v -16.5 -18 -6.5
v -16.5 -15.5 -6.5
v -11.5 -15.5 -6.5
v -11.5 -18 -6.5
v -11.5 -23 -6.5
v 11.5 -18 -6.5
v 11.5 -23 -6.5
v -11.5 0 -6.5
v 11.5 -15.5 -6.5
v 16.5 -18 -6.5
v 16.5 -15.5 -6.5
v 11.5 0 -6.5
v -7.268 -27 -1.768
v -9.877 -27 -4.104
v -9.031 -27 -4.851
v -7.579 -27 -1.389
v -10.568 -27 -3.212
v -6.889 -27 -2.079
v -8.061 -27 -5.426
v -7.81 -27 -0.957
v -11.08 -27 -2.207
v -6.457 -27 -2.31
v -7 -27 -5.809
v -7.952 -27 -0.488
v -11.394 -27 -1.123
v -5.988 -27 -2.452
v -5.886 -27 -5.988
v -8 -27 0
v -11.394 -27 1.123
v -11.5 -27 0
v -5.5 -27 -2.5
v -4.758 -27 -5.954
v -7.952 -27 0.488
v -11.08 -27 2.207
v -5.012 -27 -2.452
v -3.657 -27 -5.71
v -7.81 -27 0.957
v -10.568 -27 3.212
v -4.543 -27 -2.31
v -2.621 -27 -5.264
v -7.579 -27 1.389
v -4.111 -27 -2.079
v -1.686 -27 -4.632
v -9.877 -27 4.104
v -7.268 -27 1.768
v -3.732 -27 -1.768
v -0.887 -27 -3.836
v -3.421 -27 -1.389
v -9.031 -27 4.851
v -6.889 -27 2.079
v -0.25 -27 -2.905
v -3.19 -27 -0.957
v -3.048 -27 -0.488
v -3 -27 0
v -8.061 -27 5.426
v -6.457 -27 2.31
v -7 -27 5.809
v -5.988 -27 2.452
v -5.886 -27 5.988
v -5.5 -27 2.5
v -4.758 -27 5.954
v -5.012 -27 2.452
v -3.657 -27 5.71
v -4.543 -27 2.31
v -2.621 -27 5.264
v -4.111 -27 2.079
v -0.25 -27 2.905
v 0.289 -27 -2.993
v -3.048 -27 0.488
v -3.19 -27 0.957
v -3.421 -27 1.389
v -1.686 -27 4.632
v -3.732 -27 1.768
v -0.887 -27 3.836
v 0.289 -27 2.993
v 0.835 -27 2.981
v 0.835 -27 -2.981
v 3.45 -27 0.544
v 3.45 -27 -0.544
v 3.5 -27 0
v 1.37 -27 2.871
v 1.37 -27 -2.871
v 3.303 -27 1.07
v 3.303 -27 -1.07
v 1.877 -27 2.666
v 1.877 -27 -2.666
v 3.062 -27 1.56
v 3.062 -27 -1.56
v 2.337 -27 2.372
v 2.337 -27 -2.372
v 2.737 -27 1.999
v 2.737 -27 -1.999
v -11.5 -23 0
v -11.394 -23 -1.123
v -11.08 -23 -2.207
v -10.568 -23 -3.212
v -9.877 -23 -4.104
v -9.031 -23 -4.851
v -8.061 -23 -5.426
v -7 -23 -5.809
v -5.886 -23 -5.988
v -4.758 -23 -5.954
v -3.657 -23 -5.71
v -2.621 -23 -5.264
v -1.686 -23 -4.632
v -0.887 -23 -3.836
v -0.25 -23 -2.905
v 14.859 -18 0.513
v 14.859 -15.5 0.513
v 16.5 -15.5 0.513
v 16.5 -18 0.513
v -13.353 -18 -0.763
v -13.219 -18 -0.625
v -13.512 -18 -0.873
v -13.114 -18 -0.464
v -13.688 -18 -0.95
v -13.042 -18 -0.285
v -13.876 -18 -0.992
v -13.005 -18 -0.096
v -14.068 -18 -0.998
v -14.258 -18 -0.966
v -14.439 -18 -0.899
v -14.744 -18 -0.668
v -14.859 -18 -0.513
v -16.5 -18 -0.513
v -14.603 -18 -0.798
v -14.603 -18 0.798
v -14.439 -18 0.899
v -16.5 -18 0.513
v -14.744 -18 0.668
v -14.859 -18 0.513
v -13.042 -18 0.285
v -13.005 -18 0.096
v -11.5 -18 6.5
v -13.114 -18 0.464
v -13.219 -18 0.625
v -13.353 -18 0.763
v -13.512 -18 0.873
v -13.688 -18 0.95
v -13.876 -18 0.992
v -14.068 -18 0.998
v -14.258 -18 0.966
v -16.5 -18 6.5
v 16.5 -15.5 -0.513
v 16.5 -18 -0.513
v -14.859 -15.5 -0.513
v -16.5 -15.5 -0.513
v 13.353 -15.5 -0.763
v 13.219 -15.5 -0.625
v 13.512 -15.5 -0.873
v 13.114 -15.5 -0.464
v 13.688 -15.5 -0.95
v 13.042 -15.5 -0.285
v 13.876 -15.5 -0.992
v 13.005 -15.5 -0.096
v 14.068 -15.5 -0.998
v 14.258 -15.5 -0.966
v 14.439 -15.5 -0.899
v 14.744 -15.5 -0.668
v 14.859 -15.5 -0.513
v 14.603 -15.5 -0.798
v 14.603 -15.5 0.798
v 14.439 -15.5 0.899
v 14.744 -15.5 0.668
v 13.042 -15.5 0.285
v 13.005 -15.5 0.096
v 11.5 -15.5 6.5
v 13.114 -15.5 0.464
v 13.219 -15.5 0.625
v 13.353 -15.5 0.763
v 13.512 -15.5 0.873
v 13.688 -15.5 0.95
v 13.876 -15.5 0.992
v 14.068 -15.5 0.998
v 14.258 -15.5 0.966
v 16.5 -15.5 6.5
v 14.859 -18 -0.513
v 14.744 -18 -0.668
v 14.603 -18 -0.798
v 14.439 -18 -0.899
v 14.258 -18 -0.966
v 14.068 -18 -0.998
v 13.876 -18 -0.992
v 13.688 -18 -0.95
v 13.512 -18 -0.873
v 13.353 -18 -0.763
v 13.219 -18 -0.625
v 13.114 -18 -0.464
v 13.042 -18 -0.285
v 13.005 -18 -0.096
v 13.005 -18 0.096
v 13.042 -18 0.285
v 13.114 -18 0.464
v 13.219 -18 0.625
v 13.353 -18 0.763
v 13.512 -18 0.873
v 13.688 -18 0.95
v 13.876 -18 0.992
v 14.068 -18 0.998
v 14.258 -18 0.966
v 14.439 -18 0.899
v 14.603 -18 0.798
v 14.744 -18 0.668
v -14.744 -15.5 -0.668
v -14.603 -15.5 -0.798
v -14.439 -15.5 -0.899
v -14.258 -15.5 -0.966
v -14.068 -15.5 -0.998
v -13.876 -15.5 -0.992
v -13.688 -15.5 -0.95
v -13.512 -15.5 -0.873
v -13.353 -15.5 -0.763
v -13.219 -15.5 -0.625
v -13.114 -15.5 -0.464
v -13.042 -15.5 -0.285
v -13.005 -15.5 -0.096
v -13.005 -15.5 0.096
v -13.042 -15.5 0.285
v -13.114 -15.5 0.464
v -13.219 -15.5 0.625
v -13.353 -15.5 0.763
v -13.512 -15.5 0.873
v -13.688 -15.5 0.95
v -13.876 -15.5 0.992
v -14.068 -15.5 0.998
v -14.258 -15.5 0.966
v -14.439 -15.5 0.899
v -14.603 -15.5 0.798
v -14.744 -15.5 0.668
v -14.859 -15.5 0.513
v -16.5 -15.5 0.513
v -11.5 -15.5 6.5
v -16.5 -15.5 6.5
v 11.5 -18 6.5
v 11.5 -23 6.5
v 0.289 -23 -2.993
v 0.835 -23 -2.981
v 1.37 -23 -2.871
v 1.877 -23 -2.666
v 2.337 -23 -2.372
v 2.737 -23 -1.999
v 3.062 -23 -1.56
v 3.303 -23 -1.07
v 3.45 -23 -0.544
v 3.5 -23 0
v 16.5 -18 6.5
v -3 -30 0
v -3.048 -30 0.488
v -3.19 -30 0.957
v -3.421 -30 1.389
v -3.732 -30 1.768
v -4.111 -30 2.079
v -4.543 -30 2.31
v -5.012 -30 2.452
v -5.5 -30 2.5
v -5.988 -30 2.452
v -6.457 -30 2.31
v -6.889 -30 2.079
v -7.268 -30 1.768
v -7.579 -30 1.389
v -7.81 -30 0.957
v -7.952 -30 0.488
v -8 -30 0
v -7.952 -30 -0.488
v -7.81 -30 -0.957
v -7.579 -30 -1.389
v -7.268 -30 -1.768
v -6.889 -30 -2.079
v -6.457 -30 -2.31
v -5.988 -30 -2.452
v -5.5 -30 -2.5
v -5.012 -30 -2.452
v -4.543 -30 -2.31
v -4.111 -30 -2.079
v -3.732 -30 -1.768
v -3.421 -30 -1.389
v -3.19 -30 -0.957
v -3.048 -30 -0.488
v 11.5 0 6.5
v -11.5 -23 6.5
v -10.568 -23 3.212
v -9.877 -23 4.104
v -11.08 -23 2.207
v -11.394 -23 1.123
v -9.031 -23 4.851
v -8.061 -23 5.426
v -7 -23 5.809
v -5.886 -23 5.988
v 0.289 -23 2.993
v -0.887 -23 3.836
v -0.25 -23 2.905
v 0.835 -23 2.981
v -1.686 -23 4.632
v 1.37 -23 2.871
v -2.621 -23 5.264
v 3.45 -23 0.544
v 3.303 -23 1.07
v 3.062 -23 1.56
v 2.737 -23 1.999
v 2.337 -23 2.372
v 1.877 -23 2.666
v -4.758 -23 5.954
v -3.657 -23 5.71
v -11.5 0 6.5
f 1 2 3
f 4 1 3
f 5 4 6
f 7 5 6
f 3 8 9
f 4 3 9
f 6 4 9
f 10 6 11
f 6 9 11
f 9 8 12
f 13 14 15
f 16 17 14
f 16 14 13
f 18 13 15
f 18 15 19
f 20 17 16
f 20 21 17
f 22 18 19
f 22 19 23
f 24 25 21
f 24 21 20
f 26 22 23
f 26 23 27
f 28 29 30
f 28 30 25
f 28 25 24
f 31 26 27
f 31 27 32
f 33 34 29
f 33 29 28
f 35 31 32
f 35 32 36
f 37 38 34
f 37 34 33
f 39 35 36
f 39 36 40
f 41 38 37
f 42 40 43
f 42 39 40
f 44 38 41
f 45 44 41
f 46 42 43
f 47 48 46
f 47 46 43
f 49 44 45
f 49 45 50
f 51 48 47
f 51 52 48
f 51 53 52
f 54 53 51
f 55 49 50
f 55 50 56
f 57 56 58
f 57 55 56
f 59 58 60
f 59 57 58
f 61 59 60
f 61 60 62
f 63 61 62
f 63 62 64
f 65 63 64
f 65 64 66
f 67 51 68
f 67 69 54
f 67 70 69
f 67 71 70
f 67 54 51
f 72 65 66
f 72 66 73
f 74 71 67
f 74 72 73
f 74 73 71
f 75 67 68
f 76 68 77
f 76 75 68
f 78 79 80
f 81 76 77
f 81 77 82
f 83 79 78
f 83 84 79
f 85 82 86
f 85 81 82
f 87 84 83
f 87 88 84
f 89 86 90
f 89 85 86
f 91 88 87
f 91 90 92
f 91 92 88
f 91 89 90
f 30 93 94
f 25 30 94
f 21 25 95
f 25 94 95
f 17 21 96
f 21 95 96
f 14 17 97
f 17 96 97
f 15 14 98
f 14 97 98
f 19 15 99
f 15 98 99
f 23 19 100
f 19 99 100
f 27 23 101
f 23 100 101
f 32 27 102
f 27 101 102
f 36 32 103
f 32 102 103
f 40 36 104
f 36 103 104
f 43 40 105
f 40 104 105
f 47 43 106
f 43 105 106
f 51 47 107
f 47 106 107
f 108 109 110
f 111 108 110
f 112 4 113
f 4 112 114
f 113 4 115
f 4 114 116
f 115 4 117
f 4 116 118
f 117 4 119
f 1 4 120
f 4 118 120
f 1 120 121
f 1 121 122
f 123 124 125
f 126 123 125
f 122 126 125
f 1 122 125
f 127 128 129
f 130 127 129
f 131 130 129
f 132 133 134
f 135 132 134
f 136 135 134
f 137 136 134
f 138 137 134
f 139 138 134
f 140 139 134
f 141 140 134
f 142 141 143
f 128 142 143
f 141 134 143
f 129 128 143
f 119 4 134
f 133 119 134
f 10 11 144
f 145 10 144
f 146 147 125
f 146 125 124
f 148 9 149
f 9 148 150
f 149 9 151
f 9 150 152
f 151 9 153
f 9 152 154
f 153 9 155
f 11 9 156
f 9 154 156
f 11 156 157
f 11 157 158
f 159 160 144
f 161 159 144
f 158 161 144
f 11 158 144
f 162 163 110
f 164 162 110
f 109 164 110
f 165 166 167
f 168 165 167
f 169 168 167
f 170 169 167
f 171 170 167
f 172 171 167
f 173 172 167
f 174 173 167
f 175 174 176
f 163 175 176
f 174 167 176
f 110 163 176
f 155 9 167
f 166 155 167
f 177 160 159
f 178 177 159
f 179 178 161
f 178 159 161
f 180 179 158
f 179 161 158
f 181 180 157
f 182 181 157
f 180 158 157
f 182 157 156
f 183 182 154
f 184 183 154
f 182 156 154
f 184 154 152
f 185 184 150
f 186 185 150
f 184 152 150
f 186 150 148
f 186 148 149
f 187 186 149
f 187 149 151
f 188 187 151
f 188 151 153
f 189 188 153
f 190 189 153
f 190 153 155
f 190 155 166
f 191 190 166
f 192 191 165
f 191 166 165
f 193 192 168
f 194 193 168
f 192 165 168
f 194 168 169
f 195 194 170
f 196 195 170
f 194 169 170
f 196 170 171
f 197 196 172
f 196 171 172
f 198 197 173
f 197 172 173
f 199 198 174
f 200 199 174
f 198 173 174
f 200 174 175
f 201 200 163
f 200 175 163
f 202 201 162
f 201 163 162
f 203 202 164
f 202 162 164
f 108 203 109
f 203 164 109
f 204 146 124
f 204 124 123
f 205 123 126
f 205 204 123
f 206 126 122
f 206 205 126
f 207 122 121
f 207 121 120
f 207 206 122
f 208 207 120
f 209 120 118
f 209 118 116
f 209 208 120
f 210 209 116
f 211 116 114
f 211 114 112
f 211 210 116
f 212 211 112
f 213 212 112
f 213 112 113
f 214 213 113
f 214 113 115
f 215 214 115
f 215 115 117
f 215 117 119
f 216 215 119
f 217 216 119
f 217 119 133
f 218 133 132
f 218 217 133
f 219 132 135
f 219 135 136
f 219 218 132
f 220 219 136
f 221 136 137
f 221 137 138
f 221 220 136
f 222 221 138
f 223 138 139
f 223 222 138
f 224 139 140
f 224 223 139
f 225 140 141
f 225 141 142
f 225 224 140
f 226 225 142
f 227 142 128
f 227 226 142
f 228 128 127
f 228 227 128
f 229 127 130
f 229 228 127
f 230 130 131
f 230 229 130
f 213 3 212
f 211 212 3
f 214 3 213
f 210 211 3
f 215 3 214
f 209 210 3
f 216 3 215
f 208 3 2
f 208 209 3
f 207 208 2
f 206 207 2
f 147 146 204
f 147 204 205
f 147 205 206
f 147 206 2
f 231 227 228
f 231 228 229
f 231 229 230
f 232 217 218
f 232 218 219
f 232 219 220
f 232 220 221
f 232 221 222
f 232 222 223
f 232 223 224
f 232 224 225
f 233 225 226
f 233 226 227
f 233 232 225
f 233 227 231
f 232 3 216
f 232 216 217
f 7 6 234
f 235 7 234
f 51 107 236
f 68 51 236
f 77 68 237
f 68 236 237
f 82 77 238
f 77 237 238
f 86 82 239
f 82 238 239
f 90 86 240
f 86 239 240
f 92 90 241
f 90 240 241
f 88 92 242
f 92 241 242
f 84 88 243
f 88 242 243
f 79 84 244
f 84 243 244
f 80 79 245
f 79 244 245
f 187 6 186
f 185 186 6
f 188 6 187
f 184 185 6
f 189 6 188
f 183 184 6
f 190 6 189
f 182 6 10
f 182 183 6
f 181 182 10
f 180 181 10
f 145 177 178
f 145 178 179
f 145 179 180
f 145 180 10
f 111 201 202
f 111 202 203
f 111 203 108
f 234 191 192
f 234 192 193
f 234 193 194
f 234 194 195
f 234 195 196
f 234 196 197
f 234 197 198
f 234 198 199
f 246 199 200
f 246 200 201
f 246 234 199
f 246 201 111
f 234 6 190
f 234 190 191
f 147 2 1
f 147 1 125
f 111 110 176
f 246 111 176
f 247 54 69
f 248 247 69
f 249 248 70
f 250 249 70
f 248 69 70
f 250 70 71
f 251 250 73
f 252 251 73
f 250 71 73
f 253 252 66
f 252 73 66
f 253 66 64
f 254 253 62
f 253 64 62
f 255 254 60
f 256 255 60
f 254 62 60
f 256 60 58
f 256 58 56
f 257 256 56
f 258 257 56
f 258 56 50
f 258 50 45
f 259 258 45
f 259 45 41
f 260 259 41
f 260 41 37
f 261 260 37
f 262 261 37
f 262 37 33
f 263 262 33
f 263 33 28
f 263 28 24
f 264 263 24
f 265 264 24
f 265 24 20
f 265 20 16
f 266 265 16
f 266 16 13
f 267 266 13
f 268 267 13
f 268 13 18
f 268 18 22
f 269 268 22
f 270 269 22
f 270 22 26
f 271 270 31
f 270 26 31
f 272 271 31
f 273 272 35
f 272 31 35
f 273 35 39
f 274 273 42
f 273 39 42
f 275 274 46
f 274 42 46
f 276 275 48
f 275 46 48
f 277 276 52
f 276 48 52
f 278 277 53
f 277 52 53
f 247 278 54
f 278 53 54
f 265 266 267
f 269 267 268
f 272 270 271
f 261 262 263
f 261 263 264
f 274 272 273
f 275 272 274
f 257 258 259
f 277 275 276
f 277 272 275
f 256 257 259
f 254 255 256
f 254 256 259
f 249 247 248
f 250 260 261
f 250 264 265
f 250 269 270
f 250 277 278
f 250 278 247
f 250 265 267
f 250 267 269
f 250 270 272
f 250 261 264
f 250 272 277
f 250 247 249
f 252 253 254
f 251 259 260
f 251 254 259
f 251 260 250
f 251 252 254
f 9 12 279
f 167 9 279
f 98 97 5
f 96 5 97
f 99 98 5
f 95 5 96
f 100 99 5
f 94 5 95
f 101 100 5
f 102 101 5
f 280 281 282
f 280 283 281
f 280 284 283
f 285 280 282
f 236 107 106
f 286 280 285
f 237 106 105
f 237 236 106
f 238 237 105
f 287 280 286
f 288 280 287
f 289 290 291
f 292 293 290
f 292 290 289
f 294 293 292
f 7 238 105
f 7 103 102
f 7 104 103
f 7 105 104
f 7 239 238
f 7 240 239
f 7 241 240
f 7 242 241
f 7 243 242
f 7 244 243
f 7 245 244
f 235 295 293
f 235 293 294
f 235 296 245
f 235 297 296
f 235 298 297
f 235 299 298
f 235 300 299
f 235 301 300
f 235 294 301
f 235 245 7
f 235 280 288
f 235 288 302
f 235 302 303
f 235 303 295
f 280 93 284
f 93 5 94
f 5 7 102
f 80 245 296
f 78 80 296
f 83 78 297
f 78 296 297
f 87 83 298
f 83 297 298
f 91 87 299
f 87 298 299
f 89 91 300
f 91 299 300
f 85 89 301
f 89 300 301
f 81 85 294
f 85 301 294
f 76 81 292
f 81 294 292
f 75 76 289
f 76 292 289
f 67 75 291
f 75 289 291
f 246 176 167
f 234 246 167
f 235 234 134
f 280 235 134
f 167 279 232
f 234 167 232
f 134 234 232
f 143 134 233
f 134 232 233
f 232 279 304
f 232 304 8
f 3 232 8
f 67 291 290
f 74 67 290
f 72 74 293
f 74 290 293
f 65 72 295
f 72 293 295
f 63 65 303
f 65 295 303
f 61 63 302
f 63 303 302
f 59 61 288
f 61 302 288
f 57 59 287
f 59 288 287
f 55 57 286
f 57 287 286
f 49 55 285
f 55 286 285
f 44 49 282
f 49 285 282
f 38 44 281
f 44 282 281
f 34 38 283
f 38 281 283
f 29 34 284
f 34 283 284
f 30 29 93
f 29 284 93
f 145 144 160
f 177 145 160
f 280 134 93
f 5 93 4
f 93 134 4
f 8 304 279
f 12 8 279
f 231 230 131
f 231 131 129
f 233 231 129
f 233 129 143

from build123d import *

# Parameters (mm, degrees)
F0_R     = 2.5
F1_DEPTH = 23
F2_START = 15.5
F2_DEPTH = 2.5
F4_START = 23
F4_DEPTH = 4
F5_DEPTH = 30


with BuildPart() as f1:
    # F0 (on Front) → F1 (new body)
    with BuildSketch(Plane.XZ):
        Polygon((-11.5, -6.5), (11.5, -6.5), (11.5, 6.5), (-11.5, 6.5), (-11.5, 0), align=None)
        with BuildLine():
            ThreePointArc((-0.25, -2.9047375097), (-7, -5.8094750193), (-11.5, 0))
            ThreePointArc((-11.5, 0), (-7, 5.8094750193), (-0.25, 2.9047375097))
            ThreePointArc((-0.25, 2.9047375097), (2.3371173071, 2.3717082451), (3.5, 0))
            ThreePointArc((3.5, 0), (2.3371173071, -2.3717082451), (-0.25, -2.9047375097))
        make_face(mode=Mode.SUBTRACT)
        with BuildLine():
            ThreePointArc((3.5, 0), (2.3371173071, 2.3717082451), (-0.25, 2.9047375097))
            ThreePointArc((-0.25, 2.9047375097), (0.3094750193, 1.5), (0.5, 0))
            ThreePointArc((0.5, 0), (0.3094750193, -1.5), (-0.25, -2.9047375097))
            ThreePointArc((-0.25, -2.9047375097), (2.3371173071, -2.3717082451), (3.5, 0))
        make_face()
        with BuildLine():
            ThreePointArc((0.5, 0), (0.3094750193, 1.5), (-0.25, 2.9047375097))
            ThreePointArc((-0.25, 2.9047375097), (-2.5, 0), (-0.25, -2.9047375097))
            ThreePointArc((-0.25, -2.9047375097), (0.3094750193, -1.5), (0.5, 0))
        make_face()
        with BuildLine():
            ThreePointArc((-0.25, 2.9047375097), (-7, 5.8094750193), (-11.5, 0))
            ThreePointArc((-11.5, 0), (-7, -5.8094750193), (-0.25, -2.9047375097))
            ThreePointArc((-0.25, -2.9047375097), (-2.5, 0), (-0.25, 2.9047375097))
        make_face()
        with Locations((-5.5, 0)):
            Circle(F0_R, mode=Mode.SUBTRACT)
    extrude(amount=F1_DEPTH)

    # F0 (on Front) → F2 (join)
    with BuildSketch(Plane.XZ.offset(F2_START)):
        with BuildLine():
            Line((11.5, 6.5), (11.5, -6.5))
            Line((11.5, -6.5), (16.5, -6.5))
            Line((16.5, -6.5), (16.5, -0.5126835662))
            Line((16.5, -0.5126835662), (14.8585776383, -0.5126835662))
            ThreePointArc((14.8585776383, -0.5126835662), (13, 0), (14.8585776383, 0.5126835662))
            Line((14.8585776383, 0.5126835662), (16.5, 0.5126835662))
            Line((16.5, 0.5126835662), (16.5, 6.5))
            Line((16.5, 6.5), (11.5, 6.5))
        make_face()
    extrude(amount=F2_DEPTH)

    # F3: F1 across plane


with BuildPart() as f1_1:
    add(f1.part)
    add(f1.part.mirror(Plane.YZ))

    # F0 (on Front) → F4 (join)
    with BuildSketch(Plane.XZ.offset(F4_START)):
        with BuildLine():
            ThreePointArc((-0.25, 2.9047375097), (-7, 5.8094750193), (-11.5, 0))
            ThreePointArc((-11.5, 0), (-7, -5.8094750193), (-0.25, -2.9047375097))
            ThreePointArc((-0.25, -2.9047375097), (-2.5, 0), (-0.25, 2.9047375097))
        make_face()
        with Locations((-5.5, 0)):
            Circle(F0_R, mode=Mode.SUBTRACT)
        with BuildLine():
            ThreePointArc((3.5, 0), (2.3371173071, 2.3717082451), (-0.25, 2.9047375097))
            ThreePointArc((-0.25, 2.9047375097), (0.3094750193, 1.5), (0.5, 0))
            ThreePointArc((0.5, 0), (0.3094750193, -1.5), (-0.25, -2.9047375097))
            ThreePointArc((-0.25, -2.9047375097), (2.3371173071, -2.3717082451), (3.5, 0))
        make_face()
        with BuildLine():
            ThreePointArc((0.5, 0), (0.3094750193, 1.5), (-0.25, 2.9047375097))
            ThreePointArc((-0.25, 2.9047375097), (-2.5, 0), (-0.25, -2.9047375097))
            ThreePointArc((-0.25, -2.9047375097), (0.3094750193, -1.5), (0.5, 0))
        make_face()
    extrude(amount=F4_DEPTH)

    # F0 (on Front) → F5 (join)
    with BuildSketch(Plane.XZ):
        with Locations((-5.5, 0)):
            Circle(F0_R)
    extrude(amount=F5_DEPTH)


solid = f1_1.part
